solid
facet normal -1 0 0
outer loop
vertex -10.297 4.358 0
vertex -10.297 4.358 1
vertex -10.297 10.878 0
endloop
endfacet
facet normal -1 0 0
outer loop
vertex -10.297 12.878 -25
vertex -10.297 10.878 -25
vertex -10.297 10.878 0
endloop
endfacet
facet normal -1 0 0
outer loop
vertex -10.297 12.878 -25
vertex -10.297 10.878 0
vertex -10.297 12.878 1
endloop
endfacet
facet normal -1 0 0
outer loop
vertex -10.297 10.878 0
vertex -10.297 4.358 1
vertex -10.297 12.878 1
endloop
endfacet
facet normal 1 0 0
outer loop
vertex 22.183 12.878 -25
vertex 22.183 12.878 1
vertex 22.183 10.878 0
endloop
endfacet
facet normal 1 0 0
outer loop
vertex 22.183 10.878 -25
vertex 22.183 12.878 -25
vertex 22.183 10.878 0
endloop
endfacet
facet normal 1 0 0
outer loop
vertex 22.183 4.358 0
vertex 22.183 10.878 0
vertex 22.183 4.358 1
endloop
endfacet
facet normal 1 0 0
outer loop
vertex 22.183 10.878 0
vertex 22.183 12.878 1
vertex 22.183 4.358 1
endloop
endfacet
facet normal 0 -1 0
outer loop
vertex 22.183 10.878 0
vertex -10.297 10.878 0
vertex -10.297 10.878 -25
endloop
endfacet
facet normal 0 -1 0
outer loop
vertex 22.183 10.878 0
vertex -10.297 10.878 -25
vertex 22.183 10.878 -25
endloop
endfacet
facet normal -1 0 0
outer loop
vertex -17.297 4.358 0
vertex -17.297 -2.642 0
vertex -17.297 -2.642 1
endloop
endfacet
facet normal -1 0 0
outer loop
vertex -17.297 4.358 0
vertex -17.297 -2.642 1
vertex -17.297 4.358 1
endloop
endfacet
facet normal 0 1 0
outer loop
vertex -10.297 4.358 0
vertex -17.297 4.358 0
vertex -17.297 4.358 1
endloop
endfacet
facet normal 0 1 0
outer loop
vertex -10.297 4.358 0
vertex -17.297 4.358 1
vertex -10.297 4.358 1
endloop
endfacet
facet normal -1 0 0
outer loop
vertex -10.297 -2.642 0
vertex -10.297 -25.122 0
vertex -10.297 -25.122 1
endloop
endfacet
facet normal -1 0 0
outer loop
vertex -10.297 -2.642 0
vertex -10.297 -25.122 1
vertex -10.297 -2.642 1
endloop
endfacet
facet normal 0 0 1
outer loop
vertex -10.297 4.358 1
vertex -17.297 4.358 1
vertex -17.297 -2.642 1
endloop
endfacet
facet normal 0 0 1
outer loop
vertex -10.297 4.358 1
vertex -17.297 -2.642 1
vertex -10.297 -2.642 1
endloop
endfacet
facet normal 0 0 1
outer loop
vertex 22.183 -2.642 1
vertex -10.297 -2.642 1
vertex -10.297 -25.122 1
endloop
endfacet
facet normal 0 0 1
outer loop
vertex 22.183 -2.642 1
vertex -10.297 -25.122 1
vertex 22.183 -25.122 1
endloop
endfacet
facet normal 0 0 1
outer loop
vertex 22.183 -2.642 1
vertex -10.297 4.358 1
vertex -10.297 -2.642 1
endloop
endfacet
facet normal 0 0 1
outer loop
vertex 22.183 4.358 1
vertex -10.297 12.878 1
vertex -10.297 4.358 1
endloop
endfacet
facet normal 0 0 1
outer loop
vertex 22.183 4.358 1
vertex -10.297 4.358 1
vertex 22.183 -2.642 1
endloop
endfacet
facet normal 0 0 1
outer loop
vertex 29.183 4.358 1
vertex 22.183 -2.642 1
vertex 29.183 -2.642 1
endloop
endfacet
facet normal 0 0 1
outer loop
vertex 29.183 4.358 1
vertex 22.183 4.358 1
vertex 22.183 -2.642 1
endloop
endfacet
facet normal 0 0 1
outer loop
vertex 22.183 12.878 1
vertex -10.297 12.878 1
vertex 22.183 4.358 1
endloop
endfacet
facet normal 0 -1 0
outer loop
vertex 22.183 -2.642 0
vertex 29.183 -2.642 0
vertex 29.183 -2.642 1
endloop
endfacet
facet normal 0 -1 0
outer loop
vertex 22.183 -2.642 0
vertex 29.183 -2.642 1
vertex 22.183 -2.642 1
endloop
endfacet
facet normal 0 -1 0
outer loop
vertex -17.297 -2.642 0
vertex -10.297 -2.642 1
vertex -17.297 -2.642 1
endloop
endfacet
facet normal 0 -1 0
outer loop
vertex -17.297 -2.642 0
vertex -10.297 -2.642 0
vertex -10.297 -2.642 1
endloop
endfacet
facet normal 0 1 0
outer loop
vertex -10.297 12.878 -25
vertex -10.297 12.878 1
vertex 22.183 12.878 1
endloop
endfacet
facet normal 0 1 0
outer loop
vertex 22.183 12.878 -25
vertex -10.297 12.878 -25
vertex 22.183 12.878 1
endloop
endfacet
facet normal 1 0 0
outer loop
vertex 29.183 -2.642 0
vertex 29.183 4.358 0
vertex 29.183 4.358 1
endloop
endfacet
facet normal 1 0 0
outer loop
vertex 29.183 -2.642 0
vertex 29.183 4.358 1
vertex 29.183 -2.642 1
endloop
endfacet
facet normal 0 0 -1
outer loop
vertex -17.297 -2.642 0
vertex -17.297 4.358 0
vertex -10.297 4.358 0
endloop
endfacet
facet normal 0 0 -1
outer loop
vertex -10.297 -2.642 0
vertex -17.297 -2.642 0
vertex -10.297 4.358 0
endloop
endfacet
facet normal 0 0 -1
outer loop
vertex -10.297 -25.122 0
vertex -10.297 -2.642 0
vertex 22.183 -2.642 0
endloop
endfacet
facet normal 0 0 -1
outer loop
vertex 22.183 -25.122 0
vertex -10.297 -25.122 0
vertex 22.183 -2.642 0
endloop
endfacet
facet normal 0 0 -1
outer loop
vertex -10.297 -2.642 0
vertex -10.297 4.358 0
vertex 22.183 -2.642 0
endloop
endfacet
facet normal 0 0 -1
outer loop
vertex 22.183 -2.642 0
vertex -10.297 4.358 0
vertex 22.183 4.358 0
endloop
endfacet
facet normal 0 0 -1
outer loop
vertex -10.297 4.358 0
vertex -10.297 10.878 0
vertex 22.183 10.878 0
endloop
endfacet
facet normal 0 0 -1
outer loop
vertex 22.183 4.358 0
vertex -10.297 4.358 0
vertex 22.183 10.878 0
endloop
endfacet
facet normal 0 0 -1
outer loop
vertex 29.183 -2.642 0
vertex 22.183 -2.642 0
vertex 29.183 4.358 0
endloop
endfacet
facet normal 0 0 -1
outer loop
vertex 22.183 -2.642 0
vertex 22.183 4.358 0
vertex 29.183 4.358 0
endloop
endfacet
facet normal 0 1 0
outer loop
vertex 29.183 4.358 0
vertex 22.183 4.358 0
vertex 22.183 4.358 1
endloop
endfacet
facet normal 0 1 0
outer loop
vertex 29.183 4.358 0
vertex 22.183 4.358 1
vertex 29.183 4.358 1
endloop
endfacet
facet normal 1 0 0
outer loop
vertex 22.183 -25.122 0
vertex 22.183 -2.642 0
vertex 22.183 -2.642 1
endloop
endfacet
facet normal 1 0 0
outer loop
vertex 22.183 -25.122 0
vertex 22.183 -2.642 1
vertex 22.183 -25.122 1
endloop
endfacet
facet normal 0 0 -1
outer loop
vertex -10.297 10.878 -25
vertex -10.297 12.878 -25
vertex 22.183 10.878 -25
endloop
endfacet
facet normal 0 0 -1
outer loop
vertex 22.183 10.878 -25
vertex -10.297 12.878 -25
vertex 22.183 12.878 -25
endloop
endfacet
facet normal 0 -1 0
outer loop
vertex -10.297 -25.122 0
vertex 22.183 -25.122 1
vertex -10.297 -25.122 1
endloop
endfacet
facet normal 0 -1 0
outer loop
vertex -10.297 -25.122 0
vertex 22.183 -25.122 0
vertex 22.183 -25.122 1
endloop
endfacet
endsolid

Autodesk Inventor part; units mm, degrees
ref_plane "YZ Plane" through (0, 0, 0) normal (1, 0, 0) x (0, 1, 0)
ref_plane "XZ Plane" through (0, 0, 0) normal (0, 1, 0) x (-1, 0, 0)
ref_plane "XY Plane" through (0, 0, 0) normal (0, 0, 1) x (1, 0, 0)
sketch "Sketch1" plane through (0, 0, 0) normal (0, 0, 1) x (1, 0, 0)
  line L0 (-10.2966, 10.8783) -> (22.1834, 10.8783)
  line L1 (22.1834, 10.8783) -> (22.1834, -25.1217)
  line L2 (22.1834, -25.1217) -> (-10.2966, -25.1217)
  line L3 (-10.2966, -25.1217) -> (-10.2966, 10.8783)
  line L4 (-10.2966, -25.1217) -> (-10.2966, -2.6417)
  line L5 (-10.2966, -2.6417) -> (-17.2966, -2.6417)
  line L6 (-17.2966, -2.6417) -> (-17.2966, 4.3583)
  line L7 (-17.2966, 4.3583) -> (-10.2966, 4.3583)
  line L8 (22.1834, 4.3583) -> (29.1834, 4.3583)
  line L9 (29.1834, 4.3583) -> (29.1834, -2.6417)
  line L10 (29.1834, -2.6417) -> (22.1834, -2.6417)
  line L11 (-10.2966, 10.8783) -> (-10.2966, 12.8783)
  line L12 (-10.2966, 12.8783) -> (22.1834, 12.8783)
  line L13 (22.1834, 12.8783) -> (22.1834, 10.8783)
  point P0 (0, 0)
  dimension "d0" = 32.48
  dimension "d1" = 36
  dimension "d2" = 22.48
  dimension "d3" = 7
  dimension "d4" = 90
  dimension "d5" = 7
  dimension "d6" = 7
  dimension "d7" = 2
extrude "Extrusion1" add sketch "Sketch1" along normal blind 1
extrude "Extrusion2" add sketch "Sketch1" against normal blind 25 contours L11 L12 L13 L0
properties part number "shell 6.0 cover"
